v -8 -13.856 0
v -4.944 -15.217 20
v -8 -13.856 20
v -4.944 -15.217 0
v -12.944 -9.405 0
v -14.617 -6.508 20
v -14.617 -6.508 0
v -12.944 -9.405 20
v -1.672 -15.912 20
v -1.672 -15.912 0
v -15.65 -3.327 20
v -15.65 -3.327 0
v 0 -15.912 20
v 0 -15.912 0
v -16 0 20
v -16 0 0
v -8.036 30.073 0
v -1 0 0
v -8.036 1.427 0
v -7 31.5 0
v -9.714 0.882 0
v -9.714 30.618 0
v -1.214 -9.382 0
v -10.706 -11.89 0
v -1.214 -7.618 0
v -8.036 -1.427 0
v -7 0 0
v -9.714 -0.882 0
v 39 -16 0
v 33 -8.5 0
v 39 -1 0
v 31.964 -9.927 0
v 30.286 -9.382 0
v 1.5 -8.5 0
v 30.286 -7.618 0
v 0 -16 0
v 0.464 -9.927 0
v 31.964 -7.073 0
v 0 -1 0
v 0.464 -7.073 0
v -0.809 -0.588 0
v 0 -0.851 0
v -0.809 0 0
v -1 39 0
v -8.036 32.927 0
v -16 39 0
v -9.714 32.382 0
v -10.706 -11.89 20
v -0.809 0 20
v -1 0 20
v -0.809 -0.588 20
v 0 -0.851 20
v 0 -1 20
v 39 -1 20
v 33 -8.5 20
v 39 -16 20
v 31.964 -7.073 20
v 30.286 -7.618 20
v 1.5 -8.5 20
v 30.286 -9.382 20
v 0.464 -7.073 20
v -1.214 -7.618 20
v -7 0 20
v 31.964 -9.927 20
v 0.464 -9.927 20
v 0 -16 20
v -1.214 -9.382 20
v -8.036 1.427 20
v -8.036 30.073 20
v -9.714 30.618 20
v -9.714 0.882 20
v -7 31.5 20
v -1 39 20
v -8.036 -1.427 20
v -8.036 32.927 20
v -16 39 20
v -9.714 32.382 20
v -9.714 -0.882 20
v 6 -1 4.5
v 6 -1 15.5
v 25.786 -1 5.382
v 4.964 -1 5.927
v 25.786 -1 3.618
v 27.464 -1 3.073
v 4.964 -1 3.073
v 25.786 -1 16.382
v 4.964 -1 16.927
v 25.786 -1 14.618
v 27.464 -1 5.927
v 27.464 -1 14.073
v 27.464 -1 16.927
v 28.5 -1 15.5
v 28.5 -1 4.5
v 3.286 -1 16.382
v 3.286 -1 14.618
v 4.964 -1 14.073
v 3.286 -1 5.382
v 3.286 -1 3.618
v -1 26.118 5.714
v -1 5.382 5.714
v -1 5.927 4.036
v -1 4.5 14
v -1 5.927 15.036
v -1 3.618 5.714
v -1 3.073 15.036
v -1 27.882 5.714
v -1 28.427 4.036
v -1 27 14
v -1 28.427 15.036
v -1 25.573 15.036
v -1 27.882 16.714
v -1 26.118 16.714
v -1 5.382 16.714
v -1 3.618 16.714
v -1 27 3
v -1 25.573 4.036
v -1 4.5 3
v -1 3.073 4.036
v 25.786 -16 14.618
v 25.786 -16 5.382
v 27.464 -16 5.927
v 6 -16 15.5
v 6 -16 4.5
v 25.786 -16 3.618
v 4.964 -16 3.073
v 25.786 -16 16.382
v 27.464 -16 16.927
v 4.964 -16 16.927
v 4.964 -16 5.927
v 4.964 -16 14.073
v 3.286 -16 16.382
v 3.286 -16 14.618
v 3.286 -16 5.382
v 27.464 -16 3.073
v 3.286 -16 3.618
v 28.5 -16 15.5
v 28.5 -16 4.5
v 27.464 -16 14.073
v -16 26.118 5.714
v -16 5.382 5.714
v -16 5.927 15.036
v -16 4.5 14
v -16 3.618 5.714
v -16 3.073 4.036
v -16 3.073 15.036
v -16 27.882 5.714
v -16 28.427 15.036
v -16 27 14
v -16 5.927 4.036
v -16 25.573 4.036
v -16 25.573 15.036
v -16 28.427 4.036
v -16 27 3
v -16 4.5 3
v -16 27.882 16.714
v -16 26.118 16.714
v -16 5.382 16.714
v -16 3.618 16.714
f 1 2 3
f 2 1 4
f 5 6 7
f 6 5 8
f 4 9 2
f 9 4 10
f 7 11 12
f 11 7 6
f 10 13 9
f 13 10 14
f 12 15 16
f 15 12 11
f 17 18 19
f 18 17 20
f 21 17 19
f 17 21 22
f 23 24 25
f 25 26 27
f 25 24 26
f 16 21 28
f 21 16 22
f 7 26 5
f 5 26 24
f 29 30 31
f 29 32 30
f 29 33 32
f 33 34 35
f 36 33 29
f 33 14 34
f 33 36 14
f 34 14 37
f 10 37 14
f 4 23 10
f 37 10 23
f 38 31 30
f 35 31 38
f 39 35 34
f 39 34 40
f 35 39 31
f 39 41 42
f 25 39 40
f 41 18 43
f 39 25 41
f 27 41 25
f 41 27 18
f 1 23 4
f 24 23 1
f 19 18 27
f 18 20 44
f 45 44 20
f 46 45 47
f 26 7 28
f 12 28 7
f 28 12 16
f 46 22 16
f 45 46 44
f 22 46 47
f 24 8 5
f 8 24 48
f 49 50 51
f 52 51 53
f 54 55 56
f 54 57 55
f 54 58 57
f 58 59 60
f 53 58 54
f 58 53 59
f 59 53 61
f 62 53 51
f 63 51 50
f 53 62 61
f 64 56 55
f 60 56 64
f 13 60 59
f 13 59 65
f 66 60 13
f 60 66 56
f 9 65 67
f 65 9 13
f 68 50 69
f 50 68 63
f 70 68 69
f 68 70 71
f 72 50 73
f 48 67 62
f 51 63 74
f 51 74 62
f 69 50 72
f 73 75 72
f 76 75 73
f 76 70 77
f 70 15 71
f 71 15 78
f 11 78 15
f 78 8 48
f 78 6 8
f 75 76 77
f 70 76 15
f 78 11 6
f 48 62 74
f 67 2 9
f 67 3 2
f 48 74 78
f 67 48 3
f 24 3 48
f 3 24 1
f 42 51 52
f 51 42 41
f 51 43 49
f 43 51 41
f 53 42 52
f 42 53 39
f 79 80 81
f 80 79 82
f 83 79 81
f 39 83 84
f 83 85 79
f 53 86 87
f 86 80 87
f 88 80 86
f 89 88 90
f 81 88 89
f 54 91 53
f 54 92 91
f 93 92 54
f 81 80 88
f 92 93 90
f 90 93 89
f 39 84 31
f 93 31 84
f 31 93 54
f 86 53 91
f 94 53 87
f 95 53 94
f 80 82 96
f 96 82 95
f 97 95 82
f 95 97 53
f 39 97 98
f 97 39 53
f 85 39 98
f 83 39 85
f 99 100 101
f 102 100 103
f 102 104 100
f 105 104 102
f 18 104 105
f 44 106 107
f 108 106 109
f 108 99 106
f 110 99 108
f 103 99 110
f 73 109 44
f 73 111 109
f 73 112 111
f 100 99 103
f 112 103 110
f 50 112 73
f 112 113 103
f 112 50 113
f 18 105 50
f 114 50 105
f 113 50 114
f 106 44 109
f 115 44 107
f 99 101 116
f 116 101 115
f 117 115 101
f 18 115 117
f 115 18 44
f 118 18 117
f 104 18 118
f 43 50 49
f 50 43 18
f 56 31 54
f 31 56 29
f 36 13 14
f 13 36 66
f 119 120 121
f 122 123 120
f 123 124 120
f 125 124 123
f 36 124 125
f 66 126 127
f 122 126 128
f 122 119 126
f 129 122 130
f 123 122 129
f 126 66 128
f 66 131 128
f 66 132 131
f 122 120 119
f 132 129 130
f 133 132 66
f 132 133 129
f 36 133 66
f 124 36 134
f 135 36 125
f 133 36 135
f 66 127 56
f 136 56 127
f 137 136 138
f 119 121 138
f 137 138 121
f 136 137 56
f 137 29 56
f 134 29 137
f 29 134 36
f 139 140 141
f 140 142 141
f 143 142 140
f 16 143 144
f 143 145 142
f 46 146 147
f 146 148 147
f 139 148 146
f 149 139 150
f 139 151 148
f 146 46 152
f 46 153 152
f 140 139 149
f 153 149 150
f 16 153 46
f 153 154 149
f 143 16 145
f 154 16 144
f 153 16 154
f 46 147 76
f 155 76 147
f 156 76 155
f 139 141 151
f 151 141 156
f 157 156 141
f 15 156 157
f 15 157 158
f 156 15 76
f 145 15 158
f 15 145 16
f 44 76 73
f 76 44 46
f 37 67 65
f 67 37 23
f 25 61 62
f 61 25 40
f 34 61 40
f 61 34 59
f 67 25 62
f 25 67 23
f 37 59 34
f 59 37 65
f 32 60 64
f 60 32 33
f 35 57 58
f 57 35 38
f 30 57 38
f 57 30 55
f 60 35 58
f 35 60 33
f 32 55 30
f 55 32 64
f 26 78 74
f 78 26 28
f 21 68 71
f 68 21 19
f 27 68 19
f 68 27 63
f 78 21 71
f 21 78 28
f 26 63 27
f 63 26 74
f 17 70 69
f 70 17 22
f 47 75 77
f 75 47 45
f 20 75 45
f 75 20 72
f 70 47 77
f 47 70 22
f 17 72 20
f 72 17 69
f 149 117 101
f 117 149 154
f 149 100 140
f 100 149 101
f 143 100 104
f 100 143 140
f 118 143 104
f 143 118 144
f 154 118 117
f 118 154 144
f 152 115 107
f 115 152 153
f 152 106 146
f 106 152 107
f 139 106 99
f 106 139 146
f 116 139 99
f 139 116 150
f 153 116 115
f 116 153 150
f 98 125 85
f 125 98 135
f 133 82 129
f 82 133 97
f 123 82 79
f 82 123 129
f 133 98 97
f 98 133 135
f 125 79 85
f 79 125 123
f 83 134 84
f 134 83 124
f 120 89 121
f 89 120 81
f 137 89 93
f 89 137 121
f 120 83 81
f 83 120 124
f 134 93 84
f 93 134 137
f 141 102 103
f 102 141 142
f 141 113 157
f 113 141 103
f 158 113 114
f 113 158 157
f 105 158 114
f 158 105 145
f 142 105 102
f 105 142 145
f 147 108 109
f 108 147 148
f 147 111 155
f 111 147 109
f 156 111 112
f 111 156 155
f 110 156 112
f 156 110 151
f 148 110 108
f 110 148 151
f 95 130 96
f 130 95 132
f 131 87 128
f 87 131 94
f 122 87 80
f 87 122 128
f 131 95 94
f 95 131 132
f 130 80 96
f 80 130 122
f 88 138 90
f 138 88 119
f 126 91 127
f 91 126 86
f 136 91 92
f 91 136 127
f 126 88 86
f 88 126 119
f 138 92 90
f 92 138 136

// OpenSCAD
r = 16; //18, 20
t = 15;
l = 55-r;
h = 20;

rh=3/2;
module bendBody(t, l, h, r){
    difference(){
        cylinder(h,r,r);
        if(t < r) cylinder(h, r-t, r-t);
        translate([0,-(r-t),0 ]) cube([2*r,r*2,h]);
        translate([-(r-t),0,0 ]) cube([r*2,r*2,h]);
    }

    translate([0,-r, 0])cube([l, t, h]);
    translate([-r,0, 0])cube([t, l, h]);
}



module bendBodyTopHoles(t, l, h, r, rh){
    translate([0,-(r-t)-t/2,0]){
        cylinder(h, rh, rh);
        translate([l-t/2, 0,0]) cylinder(h, rh, rh);
    }
    translate([-(r-t)-t/2,0,0]){
        cylinder(h, rh, rh);
        translate([0,l-t/2,0]) cylinder(h, rh, rh);
    }
}

module sideHolePlane(t, l, h, r, rh){
translate([-(r-t)-t/2,0,0]){
        rotate([0,90,0]) translate([0,rh*3,-t/2])cylinder(t, rh, rh);
        rotate([0,90,0]) translate([0,l-t/2-rh*3,-t/2]) cylinder(t, rh, rh);
    }
    
    
translate([0,-(r-t)-t/2,0]){
        rotate([90,0,0]) translate([rh*3,0,-t/2]) cylinder(t, rh, rh);
        rotate([90,0,0]) translate([l-t/2-rh*3, 0,-t/2]) cylinder(t, rh, rh);
    }
}
module bendBracket(t, l, h, r, rh){
    difference(){
        bendBody(t, l, h, r);
        bendBodyTopHoles(t, l, h, r, rh);
        translate([0,0,rh*3]) sideHolePlane(t, l, h, r, rh);
        translate([0,0,h-rh*3]) sideHolePlane(t, l, h, r, rh);
    }
}



bendBracket(t, l, h, r, rh);
//translate([0,0,3]) bendBracket(t, l, 5, r, rh);
//bendBracket(t+10, l, 3, r+5, rh);

//translate([-r,0,0]) cube(30);
